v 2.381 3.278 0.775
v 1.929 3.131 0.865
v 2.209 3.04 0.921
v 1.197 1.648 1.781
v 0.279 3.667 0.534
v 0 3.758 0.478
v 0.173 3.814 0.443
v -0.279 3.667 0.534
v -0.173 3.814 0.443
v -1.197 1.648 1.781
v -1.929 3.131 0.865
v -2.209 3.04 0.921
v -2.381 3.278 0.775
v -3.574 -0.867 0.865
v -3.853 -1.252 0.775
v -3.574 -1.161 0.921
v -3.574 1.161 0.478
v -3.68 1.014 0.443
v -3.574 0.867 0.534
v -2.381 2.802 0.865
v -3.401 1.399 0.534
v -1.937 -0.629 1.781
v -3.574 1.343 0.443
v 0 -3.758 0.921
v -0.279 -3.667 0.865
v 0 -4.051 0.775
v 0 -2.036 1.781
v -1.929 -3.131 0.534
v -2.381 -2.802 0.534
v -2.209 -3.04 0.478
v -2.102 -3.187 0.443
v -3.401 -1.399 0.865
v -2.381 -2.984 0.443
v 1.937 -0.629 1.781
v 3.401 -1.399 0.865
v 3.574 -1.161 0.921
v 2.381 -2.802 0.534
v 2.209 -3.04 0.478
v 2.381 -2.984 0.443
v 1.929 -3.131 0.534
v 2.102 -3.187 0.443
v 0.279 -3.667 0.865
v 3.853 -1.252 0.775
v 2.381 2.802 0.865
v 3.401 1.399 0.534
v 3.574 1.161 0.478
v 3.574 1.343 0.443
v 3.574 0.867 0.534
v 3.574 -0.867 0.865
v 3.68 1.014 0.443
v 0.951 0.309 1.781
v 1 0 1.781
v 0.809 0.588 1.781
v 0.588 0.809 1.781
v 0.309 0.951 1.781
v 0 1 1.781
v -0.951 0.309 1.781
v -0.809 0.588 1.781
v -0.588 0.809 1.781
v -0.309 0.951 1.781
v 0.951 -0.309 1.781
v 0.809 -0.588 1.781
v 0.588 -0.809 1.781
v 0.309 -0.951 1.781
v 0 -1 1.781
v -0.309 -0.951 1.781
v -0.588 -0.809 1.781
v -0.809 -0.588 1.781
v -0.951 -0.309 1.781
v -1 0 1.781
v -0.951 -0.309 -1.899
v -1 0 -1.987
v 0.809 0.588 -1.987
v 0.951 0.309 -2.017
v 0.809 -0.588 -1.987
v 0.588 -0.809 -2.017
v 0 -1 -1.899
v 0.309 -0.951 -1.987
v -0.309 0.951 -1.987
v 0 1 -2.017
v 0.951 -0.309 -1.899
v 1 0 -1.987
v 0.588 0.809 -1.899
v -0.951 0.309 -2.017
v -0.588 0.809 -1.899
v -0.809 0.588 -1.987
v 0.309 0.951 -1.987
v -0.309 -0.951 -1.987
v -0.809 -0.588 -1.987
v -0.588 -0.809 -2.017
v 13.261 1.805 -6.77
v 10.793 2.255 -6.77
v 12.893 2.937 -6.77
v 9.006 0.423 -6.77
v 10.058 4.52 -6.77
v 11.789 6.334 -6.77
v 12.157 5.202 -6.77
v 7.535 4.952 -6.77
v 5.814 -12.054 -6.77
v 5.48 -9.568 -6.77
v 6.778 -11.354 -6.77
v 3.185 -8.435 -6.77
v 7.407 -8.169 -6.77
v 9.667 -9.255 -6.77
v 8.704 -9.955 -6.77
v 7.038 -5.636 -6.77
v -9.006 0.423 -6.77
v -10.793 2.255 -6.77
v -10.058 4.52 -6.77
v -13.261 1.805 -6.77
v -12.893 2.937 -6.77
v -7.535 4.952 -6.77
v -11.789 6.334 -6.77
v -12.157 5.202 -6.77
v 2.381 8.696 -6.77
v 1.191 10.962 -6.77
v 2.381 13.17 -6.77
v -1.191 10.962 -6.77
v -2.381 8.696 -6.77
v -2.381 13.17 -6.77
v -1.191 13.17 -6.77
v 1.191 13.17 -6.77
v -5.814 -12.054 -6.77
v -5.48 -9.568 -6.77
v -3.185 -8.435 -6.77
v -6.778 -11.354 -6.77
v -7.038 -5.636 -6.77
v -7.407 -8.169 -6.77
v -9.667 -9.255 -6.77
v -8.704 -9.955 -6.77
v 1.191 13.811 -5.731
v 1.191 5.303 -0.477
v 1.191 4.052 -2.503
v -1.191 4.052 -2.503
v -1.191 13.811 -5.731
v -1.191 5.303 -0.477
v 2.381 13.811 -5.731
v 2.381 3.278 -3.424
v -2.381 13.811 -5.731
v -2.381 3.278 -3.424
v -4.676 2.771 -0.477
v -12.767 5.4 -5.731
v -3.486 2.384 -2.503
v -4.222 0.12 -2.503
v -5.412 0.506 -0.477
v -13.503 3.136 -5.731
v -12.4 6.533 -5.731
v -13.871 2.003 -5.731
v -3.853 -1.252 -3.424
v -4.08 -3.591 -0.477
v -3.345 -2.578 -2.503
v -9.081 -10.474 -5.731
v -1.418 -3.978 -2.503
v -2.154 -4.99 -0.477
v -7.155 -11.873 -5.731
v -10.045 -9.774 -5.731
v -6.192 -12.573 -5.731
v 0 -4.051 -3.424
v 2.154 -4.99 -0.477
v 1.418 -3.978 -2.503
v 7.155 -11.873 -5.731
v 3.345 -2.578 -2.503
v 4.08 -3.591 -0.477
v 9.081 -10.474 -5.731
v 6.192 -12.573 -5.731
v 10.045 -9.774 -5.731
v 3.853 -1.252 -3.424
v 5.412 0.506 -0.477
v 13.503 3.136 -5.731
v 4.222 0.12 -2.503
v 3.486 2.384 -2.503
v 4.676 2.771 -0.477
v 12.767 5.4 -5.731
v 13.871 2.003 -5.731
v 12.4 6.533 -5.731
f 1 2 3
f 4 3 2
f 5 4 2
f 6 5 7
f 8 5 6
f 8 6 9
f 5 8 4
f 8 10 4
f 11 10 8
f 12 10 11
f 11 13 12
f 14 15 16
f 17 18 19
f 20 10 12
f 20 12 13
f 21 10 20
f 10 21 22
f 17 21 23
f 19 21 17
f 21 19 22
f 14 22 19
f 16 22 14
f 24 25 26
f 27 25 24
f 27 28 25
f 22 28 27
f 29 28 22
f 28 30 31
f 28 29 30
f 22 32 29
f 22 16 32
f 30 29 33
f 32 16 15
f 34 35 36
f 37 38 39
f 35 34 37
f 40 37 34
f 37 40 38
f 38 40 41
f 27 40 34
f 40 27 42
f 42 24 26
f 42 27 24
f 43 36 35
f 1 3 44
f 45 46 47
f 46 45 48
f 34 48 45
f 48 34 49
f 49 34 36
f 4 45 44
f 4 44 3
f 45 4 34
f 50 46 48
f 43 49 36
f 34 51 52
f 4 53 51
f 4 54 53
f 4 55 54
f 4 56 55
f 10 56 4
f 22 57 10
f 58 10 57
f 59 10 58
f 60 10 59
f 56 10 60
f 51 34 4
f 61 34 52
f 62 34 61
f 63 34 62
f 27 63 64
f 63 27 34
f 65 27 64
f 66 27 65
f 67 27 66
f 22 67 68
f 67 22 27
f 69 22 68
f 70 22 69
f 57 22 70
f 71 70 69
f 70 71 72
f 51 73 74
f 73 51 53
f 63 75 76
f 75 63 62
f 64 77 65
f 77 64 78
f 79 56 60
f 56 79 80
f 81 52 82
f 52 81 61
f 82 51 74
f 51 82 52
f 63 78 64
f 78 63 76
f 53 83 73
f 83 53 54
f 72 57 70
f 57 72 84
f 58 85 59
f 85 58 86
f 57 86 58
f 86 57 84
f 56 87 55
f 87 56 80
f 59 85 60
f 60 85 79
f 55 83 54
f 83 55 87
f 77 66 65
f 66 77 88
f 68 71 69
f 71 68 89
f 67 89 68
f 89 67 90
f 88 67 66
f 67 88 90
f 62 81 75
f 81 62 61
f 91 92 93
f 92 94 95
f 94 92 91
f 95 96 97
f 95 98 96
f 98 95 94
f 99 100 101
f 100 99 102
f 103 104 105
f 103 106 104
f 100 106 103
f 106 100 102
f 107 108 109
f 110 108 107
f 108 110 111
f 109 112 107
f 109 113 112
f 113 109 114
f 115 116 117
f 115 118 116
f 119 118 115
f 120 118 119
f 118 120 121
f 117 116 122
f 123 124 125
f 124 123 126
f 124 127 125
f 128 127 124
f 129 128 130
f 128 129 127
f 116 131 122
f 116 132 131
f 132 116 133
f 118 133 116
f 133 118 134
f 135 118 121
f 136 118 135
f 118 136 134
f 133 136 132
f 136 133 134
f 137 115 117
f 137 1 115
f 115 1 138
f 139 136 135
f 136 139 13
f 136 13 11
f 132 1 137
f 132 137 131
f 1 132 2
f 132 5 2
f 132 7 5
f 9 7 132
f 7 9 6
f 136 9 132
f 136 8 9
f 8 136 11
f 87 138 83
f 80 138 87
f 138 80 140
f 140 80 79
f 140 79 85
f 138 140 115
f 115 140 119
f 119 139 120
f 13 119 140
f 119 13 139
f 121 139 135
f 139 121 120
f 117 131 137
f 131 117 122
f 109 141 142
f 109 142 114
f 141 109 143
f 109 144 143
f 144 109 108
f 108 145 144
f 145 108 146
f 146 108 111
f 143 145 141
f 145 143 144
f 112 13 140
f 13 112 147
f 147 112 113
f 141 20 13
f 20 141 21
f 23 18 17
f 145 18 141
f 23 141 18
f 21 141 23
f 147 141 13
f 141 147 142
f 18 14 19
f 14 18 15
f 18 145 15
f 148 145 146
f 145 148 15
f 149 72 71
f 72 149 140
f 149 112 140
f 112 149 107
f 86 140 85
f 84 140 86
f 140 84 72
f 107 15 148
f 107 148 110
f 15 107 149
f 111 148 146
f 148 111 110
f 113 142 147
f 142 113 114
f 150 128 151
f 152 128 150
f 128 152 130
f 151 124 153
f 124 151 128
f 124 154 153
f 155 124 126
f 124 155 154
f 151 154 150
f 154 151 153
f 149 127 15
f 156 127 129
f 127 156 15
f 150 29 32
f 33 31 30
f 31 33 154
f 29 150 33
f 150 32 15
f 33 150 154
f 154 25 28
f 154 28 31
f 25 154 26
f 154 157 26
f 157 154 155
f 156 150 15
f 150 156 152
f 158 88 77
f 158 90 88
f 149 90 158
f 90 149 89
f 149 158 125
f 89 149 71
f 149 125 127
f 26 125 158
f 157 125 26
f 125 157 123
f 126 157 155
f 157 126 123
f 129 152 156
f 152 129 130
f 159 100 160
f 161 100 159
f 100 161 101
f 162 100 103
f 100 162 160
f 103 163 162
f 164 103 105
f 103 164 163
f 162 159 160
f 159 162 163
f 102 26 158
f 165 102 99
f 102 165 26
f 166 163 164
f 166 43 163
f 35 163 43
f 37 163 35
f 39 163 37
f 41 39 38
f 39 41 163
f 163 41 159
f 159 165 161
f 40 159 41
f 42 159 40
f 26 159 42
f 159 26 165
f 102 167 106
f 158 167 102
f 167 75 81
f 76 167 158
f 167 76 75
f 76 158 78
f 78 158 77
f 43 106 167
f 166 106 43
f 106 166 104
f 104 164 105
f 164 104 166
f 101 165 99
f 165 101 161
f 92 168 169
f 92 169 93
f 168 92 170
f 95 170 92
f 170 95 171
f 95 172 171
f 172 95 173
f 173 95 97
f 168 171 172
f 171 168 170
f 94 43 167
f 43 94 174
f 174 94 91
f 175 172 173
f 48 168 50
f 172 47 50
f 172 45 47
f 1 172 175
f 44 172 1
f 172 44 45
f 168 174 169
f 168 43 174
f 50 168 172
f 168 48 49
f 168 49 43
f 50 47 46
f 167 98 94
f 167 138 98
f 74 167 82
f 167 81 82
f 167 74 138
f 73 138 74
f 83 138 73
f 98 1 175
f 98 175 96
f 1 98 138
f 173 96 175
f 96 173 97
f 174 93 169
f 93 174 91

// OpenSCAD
// We'll use celestial notation. All angles are in degrees.
azimuth = 72;
altitude = -31.7;

// Assuming the member has a square cross section, one
// dimension in mm.
member_w = 2.38125; // 3/32"
peg_d = 0.3;
leg_off = member_w*2;
leg_l = 10;
cutoff= 2;
center_hole_d = 2; // 2mm for eyehook?
truncation = 0.6; // truncation from apex

module member_slot_neg() {
    difference() {
        intersection() {
            translate([-member_w/2,0,0])
            cube(size=[member_w,100,member_w*2]);
            translate([0,0,member_w])
            rotate(-30, v=[1,0,0])
            translate([-member_w,0,-50])
            cube(size=[member_w*2,100,100]);
        }
    }
}

module leg(length,off,back) {
    difference() {
        translate([-member_w,-back,-member_w/2])
        cube(size=[member_w*2,length+off+back,member_w*1.5]);
        translate([0,off,0])
        member_slot_neg();
    }
}

floor = ((leg_l +leg_off) * sin(altitude)) - (member_w/2 * cos(altitude));

module pyramid() {
    intersection() {
        intersection_for (az = [0 : azimuth : 359] ) {
            rotate(az)
            rotate(altitude,v=[1,0,0])
            translate([-50,-100,-100])
            cube(size=[100,200,member_w+100]);
        }
        difference() {
            translate([-100,-100,-100])
            cube(size=[200,200,member_w+100-truncation]);
            cylinder(d=center_hole_d,center=true,h=200, $fn=20);
        }
        translate([-100,-100,floor+cutoff])
        cube([200,200,200]);
    }
}


module connector(azimuth,altitude) {
    for (az = [0 : azimuth : 359] ) {
        intersection() {
            pyramid();
            rotate(az)
            rotate(altitude,v=[1,0,0])
            leg(leg_l,leg_off,20);
        }
    }
}


connector(azimuth,altitude);
